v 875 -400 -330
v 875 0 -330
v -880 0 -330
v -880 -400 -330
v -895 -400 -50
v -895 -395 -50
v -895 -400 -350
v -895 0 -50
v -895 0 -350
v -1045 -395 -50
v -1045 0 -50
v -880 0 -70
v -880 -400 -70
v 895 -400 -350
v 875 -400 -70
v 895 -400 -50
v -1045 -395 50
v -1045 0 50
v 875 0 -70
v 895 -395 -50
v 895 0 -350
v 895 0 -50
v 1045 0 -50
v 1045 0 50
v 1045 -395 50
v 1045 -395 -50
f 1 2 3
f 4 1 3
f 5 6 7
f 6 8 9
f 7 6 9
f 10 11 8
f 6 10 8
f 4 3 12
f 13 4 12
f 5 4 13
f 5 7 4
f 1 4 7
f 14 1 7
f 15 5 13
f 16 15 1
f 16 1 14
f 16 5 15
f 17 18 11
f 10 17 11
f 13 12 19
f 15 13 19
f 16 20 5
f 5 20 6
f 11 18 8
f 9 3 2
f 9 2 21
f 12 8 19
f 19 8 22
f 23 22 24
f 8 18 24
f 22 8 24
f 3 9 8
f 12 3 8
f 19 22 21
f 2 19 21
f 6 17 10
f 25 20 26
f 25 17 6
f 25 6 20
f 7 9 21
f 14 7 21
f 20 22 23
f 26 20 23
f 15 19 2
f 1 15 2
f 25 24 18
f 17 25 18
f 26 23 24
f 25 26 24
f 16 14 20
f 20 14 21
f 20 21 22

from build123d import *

# Parameters (mm, degrees)
F0_W     = 20
F0_H     = 20
F0_H_2   = 260
F0_W_2   = 15
F0_W_3   = 880
F1_DEPTH = 400
F2_DEPTH = 395


# Not quite as in the source:
# - a feature names something its author has since deleted; it is built from what else it names


with BuildPart() as f1:
    # F0 (on Front) → F1 (new body)
    with BuildSketch(Plane.XZ):
        with Locations((885, -60)):
            Rectangle(F0_W, F0_H)
        Polygon((875, -70), (875, -50), (-5, -50), (-5, -70), (145, -70), align=None)
        with Locations((885, -200)):
            Rectangle(F0_W, F0_H_2)
        Polygon((-5, -70), (-5, -50), (-880, -50), (-880, -70), (-145, -70), align=None)
        with Locations((885, -340)):
            Rectangle(F0_W, F0_H)
        with Locations((-887.5, -60)):
            Rectangle(F0_W_2, F0_H)
        with Locations((435, -340)):
            Rectangle(F0_W_3, F0_H)
        with Locations((-887.5, -200)):
            Rectangle(F0_W_2, F0_H_2)
        Polygon((-5, -350), (-5, -330), (-145, -330), (-880, -330), (-880, -350), (-145, -350), align=None)
        with Locations((-887.5, -340)):
            Rectangle(F0_W_2, F0_H)
    extrude(amount=F1_DEPTH)

    # F0 (on Front) → F2 (join)
    with BuildSketch(Plane.XZ):
        Polygon((895, -50), (1045, -50), (1045, 50), (-1045, 50), (-1045, -50), (-895, -50), (-880, -50), (-5, -50), (875, -50), align=None)
    extrude(amount=F2_DEPTH)


solid = f1.part
